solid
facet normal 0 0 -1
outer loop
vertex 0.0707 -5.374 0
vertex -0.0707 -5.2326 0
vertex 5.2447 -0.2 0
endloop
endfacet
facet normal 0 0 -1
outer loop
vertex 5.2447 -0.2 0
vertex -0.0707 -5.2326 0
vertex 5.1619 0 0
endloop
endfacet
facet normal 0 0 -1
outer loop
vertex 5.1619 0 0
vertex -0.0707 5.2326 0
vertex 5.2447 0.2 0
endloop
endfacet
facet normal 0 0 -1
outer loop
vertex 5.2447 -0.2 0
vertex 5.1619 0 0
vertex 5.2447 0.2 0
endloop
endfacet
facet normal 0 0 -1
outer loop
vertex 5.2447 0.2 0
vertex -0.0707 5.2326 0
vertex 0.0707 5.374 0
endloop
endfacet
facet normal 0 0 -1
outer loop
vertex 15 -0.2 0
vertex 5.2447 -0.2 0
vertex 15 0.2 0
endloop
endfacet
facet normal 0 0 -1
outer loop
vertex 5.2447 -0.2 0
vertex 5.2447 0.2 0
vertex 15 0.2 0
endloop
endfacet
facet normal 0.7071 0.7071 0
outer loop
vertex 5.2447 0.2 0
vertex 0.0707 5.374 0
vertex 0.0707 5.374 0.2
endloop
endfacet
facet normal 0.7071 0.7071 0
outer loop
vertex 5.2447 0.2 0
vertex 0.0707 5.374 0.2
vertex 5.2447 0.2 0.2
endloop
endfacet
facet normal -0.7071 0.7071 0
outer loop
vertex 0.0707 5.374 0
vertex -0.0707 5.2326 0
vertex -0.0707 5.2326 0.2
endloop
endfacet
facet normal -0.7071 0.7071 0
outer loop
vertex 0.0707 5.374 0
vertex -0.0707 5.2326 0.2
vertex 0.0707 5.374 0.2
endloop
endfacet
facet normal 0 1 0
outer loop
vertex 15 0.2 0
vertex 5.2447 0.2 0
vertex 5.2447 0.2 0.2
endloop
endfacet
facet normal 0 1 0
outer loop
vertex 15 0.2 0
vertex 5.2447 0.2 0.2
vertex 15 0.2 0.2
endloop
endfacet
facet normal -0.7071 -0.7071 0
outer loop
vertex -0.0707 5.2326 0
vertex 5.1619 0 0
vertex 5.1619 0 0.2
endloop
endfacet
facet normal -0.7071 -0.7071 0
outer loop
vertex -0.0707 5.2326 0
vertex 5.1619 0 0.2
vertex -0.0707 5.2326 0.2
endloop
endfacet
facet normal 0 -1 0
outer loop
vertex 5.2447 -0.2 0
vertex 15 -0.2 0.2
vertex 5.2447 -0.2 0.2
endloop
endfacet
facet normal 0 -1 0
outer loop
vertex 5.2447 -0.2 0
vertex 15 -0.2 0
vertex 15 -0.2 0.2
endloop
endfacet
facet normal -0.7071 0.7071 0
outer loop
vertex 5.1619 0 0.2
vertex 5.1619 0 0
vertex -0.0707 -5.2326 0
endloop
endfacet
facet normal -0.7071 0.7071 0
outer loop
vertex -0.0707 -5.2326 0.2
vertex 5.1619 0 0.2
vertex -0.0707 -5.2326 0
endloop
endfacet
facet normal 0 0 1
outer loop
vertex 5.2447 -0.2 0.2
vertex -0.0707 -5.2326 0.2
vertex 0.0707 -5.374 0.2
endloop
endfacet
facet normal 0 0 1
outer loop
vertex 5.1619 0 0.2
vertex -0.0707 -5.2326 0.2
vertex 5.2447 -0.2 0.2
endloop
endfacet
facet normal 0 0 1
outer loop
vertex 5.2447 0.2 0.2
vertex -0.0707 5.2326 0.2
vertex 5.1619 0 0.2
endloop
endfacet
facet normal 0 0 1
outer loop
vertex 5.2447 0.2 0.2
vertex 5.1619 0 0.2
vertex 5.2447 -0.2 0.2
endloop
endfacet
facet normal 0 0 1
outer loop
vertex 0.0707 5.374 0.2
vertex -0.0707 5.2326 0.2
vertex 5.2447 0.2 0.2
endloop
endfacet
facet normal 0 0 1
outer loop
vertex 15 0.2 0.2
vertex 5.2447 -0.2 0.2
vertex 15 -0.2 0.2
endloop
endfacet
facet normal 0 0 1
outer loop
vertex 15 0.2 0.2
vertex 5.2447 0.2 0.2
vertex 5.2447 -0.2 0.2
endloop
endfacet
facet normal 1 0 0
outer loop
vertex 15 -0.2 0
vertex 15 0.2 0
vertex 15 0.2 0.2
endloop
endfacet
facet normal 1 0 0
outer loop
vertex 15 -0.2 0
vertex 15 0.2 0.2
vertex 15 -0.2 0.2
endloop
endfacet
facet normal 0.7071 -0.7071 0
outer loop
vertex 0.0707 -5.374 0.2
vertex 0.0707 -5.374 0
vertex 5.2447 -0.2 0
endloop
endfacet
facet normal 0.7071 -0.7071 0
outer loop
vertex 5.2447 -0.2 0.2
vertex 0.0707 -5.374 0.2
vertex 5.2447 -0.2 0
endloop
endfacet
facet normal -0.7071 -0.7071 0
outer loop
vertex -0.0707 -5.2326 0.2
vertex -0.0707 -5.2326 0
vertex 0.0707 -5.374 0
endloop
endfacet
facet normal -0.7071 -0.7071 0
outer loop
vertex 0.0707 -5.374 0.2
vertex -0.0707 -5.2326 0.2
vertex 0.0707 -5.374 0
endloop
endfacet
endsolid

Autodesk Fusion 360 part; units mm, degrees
sketch "Sketch1" plane through (0, 0, 0) normal (0, 0, 1) x (1, 0, 0)
  line L0 (0.0707, 5.374) -> (5.374, 0.0707)
  line L1 (5.374, 0.0707) -> (5.2326, -0.0707)
  line L2 (5.2326, -0.0707) -> (-0.0707, 5.2326)
  line L3 (-0.0707, 5.2326) -> (0.0707, 5.374)
  line L4 (0, 0) -> (25, 0) construction
  line L5 (0.0707, -5.374) -> (5.374, -0.0707)
  line L6 (-0.0707, -5.2326) -> (0.0707, -5.374)
  line L7 (5.2326, 0.0707) -> (-0.0707, -5.2326)
  line L8 (5.374, -0.0707) -> (5.2326, 0.0707)
  line L9 (5.1619, 0.2) -> (15, 0.2)
  line L10 (15, 0.2) -> (15, -0.2)
  line L11 (15, -0.2) -> (5.1619, -0.2)
  line L12 (5.1619, -0.2) -> (5.1619, 0.2)
  line L13 (0, -5.3033) -> (0, 5.3033) construction
  point P0 (0, 5.3033)
  point P1 (0, -5.3033)
  point P2 (5.3033, 0)
  point P3 (5.1619, 0)
  dimension "d39" = 25
  dimension "d40" = 0.2
  dimension "d41" = 45
  dimension "d42" = 0.4
  dimension "d46" = 15
  dimension "d48" = 7.5
extrude "Extrude1" add sketch "Sketch1" along normal blind 0.2
equation "d1001 = depth"
equation "channelwidth = 0.2 mm"
equation "depth = 0.2 mm"
equation "length = 15 mm"
equation "d40 = channelwidth"
equation "d41 = angle"
equation "d42 = channelwidth * 2"
equation "angle = 45 deg"
equation "d46 = length"
equation "d48 = length / 2"
equation "combinedwidth = channelwidth * 2"
